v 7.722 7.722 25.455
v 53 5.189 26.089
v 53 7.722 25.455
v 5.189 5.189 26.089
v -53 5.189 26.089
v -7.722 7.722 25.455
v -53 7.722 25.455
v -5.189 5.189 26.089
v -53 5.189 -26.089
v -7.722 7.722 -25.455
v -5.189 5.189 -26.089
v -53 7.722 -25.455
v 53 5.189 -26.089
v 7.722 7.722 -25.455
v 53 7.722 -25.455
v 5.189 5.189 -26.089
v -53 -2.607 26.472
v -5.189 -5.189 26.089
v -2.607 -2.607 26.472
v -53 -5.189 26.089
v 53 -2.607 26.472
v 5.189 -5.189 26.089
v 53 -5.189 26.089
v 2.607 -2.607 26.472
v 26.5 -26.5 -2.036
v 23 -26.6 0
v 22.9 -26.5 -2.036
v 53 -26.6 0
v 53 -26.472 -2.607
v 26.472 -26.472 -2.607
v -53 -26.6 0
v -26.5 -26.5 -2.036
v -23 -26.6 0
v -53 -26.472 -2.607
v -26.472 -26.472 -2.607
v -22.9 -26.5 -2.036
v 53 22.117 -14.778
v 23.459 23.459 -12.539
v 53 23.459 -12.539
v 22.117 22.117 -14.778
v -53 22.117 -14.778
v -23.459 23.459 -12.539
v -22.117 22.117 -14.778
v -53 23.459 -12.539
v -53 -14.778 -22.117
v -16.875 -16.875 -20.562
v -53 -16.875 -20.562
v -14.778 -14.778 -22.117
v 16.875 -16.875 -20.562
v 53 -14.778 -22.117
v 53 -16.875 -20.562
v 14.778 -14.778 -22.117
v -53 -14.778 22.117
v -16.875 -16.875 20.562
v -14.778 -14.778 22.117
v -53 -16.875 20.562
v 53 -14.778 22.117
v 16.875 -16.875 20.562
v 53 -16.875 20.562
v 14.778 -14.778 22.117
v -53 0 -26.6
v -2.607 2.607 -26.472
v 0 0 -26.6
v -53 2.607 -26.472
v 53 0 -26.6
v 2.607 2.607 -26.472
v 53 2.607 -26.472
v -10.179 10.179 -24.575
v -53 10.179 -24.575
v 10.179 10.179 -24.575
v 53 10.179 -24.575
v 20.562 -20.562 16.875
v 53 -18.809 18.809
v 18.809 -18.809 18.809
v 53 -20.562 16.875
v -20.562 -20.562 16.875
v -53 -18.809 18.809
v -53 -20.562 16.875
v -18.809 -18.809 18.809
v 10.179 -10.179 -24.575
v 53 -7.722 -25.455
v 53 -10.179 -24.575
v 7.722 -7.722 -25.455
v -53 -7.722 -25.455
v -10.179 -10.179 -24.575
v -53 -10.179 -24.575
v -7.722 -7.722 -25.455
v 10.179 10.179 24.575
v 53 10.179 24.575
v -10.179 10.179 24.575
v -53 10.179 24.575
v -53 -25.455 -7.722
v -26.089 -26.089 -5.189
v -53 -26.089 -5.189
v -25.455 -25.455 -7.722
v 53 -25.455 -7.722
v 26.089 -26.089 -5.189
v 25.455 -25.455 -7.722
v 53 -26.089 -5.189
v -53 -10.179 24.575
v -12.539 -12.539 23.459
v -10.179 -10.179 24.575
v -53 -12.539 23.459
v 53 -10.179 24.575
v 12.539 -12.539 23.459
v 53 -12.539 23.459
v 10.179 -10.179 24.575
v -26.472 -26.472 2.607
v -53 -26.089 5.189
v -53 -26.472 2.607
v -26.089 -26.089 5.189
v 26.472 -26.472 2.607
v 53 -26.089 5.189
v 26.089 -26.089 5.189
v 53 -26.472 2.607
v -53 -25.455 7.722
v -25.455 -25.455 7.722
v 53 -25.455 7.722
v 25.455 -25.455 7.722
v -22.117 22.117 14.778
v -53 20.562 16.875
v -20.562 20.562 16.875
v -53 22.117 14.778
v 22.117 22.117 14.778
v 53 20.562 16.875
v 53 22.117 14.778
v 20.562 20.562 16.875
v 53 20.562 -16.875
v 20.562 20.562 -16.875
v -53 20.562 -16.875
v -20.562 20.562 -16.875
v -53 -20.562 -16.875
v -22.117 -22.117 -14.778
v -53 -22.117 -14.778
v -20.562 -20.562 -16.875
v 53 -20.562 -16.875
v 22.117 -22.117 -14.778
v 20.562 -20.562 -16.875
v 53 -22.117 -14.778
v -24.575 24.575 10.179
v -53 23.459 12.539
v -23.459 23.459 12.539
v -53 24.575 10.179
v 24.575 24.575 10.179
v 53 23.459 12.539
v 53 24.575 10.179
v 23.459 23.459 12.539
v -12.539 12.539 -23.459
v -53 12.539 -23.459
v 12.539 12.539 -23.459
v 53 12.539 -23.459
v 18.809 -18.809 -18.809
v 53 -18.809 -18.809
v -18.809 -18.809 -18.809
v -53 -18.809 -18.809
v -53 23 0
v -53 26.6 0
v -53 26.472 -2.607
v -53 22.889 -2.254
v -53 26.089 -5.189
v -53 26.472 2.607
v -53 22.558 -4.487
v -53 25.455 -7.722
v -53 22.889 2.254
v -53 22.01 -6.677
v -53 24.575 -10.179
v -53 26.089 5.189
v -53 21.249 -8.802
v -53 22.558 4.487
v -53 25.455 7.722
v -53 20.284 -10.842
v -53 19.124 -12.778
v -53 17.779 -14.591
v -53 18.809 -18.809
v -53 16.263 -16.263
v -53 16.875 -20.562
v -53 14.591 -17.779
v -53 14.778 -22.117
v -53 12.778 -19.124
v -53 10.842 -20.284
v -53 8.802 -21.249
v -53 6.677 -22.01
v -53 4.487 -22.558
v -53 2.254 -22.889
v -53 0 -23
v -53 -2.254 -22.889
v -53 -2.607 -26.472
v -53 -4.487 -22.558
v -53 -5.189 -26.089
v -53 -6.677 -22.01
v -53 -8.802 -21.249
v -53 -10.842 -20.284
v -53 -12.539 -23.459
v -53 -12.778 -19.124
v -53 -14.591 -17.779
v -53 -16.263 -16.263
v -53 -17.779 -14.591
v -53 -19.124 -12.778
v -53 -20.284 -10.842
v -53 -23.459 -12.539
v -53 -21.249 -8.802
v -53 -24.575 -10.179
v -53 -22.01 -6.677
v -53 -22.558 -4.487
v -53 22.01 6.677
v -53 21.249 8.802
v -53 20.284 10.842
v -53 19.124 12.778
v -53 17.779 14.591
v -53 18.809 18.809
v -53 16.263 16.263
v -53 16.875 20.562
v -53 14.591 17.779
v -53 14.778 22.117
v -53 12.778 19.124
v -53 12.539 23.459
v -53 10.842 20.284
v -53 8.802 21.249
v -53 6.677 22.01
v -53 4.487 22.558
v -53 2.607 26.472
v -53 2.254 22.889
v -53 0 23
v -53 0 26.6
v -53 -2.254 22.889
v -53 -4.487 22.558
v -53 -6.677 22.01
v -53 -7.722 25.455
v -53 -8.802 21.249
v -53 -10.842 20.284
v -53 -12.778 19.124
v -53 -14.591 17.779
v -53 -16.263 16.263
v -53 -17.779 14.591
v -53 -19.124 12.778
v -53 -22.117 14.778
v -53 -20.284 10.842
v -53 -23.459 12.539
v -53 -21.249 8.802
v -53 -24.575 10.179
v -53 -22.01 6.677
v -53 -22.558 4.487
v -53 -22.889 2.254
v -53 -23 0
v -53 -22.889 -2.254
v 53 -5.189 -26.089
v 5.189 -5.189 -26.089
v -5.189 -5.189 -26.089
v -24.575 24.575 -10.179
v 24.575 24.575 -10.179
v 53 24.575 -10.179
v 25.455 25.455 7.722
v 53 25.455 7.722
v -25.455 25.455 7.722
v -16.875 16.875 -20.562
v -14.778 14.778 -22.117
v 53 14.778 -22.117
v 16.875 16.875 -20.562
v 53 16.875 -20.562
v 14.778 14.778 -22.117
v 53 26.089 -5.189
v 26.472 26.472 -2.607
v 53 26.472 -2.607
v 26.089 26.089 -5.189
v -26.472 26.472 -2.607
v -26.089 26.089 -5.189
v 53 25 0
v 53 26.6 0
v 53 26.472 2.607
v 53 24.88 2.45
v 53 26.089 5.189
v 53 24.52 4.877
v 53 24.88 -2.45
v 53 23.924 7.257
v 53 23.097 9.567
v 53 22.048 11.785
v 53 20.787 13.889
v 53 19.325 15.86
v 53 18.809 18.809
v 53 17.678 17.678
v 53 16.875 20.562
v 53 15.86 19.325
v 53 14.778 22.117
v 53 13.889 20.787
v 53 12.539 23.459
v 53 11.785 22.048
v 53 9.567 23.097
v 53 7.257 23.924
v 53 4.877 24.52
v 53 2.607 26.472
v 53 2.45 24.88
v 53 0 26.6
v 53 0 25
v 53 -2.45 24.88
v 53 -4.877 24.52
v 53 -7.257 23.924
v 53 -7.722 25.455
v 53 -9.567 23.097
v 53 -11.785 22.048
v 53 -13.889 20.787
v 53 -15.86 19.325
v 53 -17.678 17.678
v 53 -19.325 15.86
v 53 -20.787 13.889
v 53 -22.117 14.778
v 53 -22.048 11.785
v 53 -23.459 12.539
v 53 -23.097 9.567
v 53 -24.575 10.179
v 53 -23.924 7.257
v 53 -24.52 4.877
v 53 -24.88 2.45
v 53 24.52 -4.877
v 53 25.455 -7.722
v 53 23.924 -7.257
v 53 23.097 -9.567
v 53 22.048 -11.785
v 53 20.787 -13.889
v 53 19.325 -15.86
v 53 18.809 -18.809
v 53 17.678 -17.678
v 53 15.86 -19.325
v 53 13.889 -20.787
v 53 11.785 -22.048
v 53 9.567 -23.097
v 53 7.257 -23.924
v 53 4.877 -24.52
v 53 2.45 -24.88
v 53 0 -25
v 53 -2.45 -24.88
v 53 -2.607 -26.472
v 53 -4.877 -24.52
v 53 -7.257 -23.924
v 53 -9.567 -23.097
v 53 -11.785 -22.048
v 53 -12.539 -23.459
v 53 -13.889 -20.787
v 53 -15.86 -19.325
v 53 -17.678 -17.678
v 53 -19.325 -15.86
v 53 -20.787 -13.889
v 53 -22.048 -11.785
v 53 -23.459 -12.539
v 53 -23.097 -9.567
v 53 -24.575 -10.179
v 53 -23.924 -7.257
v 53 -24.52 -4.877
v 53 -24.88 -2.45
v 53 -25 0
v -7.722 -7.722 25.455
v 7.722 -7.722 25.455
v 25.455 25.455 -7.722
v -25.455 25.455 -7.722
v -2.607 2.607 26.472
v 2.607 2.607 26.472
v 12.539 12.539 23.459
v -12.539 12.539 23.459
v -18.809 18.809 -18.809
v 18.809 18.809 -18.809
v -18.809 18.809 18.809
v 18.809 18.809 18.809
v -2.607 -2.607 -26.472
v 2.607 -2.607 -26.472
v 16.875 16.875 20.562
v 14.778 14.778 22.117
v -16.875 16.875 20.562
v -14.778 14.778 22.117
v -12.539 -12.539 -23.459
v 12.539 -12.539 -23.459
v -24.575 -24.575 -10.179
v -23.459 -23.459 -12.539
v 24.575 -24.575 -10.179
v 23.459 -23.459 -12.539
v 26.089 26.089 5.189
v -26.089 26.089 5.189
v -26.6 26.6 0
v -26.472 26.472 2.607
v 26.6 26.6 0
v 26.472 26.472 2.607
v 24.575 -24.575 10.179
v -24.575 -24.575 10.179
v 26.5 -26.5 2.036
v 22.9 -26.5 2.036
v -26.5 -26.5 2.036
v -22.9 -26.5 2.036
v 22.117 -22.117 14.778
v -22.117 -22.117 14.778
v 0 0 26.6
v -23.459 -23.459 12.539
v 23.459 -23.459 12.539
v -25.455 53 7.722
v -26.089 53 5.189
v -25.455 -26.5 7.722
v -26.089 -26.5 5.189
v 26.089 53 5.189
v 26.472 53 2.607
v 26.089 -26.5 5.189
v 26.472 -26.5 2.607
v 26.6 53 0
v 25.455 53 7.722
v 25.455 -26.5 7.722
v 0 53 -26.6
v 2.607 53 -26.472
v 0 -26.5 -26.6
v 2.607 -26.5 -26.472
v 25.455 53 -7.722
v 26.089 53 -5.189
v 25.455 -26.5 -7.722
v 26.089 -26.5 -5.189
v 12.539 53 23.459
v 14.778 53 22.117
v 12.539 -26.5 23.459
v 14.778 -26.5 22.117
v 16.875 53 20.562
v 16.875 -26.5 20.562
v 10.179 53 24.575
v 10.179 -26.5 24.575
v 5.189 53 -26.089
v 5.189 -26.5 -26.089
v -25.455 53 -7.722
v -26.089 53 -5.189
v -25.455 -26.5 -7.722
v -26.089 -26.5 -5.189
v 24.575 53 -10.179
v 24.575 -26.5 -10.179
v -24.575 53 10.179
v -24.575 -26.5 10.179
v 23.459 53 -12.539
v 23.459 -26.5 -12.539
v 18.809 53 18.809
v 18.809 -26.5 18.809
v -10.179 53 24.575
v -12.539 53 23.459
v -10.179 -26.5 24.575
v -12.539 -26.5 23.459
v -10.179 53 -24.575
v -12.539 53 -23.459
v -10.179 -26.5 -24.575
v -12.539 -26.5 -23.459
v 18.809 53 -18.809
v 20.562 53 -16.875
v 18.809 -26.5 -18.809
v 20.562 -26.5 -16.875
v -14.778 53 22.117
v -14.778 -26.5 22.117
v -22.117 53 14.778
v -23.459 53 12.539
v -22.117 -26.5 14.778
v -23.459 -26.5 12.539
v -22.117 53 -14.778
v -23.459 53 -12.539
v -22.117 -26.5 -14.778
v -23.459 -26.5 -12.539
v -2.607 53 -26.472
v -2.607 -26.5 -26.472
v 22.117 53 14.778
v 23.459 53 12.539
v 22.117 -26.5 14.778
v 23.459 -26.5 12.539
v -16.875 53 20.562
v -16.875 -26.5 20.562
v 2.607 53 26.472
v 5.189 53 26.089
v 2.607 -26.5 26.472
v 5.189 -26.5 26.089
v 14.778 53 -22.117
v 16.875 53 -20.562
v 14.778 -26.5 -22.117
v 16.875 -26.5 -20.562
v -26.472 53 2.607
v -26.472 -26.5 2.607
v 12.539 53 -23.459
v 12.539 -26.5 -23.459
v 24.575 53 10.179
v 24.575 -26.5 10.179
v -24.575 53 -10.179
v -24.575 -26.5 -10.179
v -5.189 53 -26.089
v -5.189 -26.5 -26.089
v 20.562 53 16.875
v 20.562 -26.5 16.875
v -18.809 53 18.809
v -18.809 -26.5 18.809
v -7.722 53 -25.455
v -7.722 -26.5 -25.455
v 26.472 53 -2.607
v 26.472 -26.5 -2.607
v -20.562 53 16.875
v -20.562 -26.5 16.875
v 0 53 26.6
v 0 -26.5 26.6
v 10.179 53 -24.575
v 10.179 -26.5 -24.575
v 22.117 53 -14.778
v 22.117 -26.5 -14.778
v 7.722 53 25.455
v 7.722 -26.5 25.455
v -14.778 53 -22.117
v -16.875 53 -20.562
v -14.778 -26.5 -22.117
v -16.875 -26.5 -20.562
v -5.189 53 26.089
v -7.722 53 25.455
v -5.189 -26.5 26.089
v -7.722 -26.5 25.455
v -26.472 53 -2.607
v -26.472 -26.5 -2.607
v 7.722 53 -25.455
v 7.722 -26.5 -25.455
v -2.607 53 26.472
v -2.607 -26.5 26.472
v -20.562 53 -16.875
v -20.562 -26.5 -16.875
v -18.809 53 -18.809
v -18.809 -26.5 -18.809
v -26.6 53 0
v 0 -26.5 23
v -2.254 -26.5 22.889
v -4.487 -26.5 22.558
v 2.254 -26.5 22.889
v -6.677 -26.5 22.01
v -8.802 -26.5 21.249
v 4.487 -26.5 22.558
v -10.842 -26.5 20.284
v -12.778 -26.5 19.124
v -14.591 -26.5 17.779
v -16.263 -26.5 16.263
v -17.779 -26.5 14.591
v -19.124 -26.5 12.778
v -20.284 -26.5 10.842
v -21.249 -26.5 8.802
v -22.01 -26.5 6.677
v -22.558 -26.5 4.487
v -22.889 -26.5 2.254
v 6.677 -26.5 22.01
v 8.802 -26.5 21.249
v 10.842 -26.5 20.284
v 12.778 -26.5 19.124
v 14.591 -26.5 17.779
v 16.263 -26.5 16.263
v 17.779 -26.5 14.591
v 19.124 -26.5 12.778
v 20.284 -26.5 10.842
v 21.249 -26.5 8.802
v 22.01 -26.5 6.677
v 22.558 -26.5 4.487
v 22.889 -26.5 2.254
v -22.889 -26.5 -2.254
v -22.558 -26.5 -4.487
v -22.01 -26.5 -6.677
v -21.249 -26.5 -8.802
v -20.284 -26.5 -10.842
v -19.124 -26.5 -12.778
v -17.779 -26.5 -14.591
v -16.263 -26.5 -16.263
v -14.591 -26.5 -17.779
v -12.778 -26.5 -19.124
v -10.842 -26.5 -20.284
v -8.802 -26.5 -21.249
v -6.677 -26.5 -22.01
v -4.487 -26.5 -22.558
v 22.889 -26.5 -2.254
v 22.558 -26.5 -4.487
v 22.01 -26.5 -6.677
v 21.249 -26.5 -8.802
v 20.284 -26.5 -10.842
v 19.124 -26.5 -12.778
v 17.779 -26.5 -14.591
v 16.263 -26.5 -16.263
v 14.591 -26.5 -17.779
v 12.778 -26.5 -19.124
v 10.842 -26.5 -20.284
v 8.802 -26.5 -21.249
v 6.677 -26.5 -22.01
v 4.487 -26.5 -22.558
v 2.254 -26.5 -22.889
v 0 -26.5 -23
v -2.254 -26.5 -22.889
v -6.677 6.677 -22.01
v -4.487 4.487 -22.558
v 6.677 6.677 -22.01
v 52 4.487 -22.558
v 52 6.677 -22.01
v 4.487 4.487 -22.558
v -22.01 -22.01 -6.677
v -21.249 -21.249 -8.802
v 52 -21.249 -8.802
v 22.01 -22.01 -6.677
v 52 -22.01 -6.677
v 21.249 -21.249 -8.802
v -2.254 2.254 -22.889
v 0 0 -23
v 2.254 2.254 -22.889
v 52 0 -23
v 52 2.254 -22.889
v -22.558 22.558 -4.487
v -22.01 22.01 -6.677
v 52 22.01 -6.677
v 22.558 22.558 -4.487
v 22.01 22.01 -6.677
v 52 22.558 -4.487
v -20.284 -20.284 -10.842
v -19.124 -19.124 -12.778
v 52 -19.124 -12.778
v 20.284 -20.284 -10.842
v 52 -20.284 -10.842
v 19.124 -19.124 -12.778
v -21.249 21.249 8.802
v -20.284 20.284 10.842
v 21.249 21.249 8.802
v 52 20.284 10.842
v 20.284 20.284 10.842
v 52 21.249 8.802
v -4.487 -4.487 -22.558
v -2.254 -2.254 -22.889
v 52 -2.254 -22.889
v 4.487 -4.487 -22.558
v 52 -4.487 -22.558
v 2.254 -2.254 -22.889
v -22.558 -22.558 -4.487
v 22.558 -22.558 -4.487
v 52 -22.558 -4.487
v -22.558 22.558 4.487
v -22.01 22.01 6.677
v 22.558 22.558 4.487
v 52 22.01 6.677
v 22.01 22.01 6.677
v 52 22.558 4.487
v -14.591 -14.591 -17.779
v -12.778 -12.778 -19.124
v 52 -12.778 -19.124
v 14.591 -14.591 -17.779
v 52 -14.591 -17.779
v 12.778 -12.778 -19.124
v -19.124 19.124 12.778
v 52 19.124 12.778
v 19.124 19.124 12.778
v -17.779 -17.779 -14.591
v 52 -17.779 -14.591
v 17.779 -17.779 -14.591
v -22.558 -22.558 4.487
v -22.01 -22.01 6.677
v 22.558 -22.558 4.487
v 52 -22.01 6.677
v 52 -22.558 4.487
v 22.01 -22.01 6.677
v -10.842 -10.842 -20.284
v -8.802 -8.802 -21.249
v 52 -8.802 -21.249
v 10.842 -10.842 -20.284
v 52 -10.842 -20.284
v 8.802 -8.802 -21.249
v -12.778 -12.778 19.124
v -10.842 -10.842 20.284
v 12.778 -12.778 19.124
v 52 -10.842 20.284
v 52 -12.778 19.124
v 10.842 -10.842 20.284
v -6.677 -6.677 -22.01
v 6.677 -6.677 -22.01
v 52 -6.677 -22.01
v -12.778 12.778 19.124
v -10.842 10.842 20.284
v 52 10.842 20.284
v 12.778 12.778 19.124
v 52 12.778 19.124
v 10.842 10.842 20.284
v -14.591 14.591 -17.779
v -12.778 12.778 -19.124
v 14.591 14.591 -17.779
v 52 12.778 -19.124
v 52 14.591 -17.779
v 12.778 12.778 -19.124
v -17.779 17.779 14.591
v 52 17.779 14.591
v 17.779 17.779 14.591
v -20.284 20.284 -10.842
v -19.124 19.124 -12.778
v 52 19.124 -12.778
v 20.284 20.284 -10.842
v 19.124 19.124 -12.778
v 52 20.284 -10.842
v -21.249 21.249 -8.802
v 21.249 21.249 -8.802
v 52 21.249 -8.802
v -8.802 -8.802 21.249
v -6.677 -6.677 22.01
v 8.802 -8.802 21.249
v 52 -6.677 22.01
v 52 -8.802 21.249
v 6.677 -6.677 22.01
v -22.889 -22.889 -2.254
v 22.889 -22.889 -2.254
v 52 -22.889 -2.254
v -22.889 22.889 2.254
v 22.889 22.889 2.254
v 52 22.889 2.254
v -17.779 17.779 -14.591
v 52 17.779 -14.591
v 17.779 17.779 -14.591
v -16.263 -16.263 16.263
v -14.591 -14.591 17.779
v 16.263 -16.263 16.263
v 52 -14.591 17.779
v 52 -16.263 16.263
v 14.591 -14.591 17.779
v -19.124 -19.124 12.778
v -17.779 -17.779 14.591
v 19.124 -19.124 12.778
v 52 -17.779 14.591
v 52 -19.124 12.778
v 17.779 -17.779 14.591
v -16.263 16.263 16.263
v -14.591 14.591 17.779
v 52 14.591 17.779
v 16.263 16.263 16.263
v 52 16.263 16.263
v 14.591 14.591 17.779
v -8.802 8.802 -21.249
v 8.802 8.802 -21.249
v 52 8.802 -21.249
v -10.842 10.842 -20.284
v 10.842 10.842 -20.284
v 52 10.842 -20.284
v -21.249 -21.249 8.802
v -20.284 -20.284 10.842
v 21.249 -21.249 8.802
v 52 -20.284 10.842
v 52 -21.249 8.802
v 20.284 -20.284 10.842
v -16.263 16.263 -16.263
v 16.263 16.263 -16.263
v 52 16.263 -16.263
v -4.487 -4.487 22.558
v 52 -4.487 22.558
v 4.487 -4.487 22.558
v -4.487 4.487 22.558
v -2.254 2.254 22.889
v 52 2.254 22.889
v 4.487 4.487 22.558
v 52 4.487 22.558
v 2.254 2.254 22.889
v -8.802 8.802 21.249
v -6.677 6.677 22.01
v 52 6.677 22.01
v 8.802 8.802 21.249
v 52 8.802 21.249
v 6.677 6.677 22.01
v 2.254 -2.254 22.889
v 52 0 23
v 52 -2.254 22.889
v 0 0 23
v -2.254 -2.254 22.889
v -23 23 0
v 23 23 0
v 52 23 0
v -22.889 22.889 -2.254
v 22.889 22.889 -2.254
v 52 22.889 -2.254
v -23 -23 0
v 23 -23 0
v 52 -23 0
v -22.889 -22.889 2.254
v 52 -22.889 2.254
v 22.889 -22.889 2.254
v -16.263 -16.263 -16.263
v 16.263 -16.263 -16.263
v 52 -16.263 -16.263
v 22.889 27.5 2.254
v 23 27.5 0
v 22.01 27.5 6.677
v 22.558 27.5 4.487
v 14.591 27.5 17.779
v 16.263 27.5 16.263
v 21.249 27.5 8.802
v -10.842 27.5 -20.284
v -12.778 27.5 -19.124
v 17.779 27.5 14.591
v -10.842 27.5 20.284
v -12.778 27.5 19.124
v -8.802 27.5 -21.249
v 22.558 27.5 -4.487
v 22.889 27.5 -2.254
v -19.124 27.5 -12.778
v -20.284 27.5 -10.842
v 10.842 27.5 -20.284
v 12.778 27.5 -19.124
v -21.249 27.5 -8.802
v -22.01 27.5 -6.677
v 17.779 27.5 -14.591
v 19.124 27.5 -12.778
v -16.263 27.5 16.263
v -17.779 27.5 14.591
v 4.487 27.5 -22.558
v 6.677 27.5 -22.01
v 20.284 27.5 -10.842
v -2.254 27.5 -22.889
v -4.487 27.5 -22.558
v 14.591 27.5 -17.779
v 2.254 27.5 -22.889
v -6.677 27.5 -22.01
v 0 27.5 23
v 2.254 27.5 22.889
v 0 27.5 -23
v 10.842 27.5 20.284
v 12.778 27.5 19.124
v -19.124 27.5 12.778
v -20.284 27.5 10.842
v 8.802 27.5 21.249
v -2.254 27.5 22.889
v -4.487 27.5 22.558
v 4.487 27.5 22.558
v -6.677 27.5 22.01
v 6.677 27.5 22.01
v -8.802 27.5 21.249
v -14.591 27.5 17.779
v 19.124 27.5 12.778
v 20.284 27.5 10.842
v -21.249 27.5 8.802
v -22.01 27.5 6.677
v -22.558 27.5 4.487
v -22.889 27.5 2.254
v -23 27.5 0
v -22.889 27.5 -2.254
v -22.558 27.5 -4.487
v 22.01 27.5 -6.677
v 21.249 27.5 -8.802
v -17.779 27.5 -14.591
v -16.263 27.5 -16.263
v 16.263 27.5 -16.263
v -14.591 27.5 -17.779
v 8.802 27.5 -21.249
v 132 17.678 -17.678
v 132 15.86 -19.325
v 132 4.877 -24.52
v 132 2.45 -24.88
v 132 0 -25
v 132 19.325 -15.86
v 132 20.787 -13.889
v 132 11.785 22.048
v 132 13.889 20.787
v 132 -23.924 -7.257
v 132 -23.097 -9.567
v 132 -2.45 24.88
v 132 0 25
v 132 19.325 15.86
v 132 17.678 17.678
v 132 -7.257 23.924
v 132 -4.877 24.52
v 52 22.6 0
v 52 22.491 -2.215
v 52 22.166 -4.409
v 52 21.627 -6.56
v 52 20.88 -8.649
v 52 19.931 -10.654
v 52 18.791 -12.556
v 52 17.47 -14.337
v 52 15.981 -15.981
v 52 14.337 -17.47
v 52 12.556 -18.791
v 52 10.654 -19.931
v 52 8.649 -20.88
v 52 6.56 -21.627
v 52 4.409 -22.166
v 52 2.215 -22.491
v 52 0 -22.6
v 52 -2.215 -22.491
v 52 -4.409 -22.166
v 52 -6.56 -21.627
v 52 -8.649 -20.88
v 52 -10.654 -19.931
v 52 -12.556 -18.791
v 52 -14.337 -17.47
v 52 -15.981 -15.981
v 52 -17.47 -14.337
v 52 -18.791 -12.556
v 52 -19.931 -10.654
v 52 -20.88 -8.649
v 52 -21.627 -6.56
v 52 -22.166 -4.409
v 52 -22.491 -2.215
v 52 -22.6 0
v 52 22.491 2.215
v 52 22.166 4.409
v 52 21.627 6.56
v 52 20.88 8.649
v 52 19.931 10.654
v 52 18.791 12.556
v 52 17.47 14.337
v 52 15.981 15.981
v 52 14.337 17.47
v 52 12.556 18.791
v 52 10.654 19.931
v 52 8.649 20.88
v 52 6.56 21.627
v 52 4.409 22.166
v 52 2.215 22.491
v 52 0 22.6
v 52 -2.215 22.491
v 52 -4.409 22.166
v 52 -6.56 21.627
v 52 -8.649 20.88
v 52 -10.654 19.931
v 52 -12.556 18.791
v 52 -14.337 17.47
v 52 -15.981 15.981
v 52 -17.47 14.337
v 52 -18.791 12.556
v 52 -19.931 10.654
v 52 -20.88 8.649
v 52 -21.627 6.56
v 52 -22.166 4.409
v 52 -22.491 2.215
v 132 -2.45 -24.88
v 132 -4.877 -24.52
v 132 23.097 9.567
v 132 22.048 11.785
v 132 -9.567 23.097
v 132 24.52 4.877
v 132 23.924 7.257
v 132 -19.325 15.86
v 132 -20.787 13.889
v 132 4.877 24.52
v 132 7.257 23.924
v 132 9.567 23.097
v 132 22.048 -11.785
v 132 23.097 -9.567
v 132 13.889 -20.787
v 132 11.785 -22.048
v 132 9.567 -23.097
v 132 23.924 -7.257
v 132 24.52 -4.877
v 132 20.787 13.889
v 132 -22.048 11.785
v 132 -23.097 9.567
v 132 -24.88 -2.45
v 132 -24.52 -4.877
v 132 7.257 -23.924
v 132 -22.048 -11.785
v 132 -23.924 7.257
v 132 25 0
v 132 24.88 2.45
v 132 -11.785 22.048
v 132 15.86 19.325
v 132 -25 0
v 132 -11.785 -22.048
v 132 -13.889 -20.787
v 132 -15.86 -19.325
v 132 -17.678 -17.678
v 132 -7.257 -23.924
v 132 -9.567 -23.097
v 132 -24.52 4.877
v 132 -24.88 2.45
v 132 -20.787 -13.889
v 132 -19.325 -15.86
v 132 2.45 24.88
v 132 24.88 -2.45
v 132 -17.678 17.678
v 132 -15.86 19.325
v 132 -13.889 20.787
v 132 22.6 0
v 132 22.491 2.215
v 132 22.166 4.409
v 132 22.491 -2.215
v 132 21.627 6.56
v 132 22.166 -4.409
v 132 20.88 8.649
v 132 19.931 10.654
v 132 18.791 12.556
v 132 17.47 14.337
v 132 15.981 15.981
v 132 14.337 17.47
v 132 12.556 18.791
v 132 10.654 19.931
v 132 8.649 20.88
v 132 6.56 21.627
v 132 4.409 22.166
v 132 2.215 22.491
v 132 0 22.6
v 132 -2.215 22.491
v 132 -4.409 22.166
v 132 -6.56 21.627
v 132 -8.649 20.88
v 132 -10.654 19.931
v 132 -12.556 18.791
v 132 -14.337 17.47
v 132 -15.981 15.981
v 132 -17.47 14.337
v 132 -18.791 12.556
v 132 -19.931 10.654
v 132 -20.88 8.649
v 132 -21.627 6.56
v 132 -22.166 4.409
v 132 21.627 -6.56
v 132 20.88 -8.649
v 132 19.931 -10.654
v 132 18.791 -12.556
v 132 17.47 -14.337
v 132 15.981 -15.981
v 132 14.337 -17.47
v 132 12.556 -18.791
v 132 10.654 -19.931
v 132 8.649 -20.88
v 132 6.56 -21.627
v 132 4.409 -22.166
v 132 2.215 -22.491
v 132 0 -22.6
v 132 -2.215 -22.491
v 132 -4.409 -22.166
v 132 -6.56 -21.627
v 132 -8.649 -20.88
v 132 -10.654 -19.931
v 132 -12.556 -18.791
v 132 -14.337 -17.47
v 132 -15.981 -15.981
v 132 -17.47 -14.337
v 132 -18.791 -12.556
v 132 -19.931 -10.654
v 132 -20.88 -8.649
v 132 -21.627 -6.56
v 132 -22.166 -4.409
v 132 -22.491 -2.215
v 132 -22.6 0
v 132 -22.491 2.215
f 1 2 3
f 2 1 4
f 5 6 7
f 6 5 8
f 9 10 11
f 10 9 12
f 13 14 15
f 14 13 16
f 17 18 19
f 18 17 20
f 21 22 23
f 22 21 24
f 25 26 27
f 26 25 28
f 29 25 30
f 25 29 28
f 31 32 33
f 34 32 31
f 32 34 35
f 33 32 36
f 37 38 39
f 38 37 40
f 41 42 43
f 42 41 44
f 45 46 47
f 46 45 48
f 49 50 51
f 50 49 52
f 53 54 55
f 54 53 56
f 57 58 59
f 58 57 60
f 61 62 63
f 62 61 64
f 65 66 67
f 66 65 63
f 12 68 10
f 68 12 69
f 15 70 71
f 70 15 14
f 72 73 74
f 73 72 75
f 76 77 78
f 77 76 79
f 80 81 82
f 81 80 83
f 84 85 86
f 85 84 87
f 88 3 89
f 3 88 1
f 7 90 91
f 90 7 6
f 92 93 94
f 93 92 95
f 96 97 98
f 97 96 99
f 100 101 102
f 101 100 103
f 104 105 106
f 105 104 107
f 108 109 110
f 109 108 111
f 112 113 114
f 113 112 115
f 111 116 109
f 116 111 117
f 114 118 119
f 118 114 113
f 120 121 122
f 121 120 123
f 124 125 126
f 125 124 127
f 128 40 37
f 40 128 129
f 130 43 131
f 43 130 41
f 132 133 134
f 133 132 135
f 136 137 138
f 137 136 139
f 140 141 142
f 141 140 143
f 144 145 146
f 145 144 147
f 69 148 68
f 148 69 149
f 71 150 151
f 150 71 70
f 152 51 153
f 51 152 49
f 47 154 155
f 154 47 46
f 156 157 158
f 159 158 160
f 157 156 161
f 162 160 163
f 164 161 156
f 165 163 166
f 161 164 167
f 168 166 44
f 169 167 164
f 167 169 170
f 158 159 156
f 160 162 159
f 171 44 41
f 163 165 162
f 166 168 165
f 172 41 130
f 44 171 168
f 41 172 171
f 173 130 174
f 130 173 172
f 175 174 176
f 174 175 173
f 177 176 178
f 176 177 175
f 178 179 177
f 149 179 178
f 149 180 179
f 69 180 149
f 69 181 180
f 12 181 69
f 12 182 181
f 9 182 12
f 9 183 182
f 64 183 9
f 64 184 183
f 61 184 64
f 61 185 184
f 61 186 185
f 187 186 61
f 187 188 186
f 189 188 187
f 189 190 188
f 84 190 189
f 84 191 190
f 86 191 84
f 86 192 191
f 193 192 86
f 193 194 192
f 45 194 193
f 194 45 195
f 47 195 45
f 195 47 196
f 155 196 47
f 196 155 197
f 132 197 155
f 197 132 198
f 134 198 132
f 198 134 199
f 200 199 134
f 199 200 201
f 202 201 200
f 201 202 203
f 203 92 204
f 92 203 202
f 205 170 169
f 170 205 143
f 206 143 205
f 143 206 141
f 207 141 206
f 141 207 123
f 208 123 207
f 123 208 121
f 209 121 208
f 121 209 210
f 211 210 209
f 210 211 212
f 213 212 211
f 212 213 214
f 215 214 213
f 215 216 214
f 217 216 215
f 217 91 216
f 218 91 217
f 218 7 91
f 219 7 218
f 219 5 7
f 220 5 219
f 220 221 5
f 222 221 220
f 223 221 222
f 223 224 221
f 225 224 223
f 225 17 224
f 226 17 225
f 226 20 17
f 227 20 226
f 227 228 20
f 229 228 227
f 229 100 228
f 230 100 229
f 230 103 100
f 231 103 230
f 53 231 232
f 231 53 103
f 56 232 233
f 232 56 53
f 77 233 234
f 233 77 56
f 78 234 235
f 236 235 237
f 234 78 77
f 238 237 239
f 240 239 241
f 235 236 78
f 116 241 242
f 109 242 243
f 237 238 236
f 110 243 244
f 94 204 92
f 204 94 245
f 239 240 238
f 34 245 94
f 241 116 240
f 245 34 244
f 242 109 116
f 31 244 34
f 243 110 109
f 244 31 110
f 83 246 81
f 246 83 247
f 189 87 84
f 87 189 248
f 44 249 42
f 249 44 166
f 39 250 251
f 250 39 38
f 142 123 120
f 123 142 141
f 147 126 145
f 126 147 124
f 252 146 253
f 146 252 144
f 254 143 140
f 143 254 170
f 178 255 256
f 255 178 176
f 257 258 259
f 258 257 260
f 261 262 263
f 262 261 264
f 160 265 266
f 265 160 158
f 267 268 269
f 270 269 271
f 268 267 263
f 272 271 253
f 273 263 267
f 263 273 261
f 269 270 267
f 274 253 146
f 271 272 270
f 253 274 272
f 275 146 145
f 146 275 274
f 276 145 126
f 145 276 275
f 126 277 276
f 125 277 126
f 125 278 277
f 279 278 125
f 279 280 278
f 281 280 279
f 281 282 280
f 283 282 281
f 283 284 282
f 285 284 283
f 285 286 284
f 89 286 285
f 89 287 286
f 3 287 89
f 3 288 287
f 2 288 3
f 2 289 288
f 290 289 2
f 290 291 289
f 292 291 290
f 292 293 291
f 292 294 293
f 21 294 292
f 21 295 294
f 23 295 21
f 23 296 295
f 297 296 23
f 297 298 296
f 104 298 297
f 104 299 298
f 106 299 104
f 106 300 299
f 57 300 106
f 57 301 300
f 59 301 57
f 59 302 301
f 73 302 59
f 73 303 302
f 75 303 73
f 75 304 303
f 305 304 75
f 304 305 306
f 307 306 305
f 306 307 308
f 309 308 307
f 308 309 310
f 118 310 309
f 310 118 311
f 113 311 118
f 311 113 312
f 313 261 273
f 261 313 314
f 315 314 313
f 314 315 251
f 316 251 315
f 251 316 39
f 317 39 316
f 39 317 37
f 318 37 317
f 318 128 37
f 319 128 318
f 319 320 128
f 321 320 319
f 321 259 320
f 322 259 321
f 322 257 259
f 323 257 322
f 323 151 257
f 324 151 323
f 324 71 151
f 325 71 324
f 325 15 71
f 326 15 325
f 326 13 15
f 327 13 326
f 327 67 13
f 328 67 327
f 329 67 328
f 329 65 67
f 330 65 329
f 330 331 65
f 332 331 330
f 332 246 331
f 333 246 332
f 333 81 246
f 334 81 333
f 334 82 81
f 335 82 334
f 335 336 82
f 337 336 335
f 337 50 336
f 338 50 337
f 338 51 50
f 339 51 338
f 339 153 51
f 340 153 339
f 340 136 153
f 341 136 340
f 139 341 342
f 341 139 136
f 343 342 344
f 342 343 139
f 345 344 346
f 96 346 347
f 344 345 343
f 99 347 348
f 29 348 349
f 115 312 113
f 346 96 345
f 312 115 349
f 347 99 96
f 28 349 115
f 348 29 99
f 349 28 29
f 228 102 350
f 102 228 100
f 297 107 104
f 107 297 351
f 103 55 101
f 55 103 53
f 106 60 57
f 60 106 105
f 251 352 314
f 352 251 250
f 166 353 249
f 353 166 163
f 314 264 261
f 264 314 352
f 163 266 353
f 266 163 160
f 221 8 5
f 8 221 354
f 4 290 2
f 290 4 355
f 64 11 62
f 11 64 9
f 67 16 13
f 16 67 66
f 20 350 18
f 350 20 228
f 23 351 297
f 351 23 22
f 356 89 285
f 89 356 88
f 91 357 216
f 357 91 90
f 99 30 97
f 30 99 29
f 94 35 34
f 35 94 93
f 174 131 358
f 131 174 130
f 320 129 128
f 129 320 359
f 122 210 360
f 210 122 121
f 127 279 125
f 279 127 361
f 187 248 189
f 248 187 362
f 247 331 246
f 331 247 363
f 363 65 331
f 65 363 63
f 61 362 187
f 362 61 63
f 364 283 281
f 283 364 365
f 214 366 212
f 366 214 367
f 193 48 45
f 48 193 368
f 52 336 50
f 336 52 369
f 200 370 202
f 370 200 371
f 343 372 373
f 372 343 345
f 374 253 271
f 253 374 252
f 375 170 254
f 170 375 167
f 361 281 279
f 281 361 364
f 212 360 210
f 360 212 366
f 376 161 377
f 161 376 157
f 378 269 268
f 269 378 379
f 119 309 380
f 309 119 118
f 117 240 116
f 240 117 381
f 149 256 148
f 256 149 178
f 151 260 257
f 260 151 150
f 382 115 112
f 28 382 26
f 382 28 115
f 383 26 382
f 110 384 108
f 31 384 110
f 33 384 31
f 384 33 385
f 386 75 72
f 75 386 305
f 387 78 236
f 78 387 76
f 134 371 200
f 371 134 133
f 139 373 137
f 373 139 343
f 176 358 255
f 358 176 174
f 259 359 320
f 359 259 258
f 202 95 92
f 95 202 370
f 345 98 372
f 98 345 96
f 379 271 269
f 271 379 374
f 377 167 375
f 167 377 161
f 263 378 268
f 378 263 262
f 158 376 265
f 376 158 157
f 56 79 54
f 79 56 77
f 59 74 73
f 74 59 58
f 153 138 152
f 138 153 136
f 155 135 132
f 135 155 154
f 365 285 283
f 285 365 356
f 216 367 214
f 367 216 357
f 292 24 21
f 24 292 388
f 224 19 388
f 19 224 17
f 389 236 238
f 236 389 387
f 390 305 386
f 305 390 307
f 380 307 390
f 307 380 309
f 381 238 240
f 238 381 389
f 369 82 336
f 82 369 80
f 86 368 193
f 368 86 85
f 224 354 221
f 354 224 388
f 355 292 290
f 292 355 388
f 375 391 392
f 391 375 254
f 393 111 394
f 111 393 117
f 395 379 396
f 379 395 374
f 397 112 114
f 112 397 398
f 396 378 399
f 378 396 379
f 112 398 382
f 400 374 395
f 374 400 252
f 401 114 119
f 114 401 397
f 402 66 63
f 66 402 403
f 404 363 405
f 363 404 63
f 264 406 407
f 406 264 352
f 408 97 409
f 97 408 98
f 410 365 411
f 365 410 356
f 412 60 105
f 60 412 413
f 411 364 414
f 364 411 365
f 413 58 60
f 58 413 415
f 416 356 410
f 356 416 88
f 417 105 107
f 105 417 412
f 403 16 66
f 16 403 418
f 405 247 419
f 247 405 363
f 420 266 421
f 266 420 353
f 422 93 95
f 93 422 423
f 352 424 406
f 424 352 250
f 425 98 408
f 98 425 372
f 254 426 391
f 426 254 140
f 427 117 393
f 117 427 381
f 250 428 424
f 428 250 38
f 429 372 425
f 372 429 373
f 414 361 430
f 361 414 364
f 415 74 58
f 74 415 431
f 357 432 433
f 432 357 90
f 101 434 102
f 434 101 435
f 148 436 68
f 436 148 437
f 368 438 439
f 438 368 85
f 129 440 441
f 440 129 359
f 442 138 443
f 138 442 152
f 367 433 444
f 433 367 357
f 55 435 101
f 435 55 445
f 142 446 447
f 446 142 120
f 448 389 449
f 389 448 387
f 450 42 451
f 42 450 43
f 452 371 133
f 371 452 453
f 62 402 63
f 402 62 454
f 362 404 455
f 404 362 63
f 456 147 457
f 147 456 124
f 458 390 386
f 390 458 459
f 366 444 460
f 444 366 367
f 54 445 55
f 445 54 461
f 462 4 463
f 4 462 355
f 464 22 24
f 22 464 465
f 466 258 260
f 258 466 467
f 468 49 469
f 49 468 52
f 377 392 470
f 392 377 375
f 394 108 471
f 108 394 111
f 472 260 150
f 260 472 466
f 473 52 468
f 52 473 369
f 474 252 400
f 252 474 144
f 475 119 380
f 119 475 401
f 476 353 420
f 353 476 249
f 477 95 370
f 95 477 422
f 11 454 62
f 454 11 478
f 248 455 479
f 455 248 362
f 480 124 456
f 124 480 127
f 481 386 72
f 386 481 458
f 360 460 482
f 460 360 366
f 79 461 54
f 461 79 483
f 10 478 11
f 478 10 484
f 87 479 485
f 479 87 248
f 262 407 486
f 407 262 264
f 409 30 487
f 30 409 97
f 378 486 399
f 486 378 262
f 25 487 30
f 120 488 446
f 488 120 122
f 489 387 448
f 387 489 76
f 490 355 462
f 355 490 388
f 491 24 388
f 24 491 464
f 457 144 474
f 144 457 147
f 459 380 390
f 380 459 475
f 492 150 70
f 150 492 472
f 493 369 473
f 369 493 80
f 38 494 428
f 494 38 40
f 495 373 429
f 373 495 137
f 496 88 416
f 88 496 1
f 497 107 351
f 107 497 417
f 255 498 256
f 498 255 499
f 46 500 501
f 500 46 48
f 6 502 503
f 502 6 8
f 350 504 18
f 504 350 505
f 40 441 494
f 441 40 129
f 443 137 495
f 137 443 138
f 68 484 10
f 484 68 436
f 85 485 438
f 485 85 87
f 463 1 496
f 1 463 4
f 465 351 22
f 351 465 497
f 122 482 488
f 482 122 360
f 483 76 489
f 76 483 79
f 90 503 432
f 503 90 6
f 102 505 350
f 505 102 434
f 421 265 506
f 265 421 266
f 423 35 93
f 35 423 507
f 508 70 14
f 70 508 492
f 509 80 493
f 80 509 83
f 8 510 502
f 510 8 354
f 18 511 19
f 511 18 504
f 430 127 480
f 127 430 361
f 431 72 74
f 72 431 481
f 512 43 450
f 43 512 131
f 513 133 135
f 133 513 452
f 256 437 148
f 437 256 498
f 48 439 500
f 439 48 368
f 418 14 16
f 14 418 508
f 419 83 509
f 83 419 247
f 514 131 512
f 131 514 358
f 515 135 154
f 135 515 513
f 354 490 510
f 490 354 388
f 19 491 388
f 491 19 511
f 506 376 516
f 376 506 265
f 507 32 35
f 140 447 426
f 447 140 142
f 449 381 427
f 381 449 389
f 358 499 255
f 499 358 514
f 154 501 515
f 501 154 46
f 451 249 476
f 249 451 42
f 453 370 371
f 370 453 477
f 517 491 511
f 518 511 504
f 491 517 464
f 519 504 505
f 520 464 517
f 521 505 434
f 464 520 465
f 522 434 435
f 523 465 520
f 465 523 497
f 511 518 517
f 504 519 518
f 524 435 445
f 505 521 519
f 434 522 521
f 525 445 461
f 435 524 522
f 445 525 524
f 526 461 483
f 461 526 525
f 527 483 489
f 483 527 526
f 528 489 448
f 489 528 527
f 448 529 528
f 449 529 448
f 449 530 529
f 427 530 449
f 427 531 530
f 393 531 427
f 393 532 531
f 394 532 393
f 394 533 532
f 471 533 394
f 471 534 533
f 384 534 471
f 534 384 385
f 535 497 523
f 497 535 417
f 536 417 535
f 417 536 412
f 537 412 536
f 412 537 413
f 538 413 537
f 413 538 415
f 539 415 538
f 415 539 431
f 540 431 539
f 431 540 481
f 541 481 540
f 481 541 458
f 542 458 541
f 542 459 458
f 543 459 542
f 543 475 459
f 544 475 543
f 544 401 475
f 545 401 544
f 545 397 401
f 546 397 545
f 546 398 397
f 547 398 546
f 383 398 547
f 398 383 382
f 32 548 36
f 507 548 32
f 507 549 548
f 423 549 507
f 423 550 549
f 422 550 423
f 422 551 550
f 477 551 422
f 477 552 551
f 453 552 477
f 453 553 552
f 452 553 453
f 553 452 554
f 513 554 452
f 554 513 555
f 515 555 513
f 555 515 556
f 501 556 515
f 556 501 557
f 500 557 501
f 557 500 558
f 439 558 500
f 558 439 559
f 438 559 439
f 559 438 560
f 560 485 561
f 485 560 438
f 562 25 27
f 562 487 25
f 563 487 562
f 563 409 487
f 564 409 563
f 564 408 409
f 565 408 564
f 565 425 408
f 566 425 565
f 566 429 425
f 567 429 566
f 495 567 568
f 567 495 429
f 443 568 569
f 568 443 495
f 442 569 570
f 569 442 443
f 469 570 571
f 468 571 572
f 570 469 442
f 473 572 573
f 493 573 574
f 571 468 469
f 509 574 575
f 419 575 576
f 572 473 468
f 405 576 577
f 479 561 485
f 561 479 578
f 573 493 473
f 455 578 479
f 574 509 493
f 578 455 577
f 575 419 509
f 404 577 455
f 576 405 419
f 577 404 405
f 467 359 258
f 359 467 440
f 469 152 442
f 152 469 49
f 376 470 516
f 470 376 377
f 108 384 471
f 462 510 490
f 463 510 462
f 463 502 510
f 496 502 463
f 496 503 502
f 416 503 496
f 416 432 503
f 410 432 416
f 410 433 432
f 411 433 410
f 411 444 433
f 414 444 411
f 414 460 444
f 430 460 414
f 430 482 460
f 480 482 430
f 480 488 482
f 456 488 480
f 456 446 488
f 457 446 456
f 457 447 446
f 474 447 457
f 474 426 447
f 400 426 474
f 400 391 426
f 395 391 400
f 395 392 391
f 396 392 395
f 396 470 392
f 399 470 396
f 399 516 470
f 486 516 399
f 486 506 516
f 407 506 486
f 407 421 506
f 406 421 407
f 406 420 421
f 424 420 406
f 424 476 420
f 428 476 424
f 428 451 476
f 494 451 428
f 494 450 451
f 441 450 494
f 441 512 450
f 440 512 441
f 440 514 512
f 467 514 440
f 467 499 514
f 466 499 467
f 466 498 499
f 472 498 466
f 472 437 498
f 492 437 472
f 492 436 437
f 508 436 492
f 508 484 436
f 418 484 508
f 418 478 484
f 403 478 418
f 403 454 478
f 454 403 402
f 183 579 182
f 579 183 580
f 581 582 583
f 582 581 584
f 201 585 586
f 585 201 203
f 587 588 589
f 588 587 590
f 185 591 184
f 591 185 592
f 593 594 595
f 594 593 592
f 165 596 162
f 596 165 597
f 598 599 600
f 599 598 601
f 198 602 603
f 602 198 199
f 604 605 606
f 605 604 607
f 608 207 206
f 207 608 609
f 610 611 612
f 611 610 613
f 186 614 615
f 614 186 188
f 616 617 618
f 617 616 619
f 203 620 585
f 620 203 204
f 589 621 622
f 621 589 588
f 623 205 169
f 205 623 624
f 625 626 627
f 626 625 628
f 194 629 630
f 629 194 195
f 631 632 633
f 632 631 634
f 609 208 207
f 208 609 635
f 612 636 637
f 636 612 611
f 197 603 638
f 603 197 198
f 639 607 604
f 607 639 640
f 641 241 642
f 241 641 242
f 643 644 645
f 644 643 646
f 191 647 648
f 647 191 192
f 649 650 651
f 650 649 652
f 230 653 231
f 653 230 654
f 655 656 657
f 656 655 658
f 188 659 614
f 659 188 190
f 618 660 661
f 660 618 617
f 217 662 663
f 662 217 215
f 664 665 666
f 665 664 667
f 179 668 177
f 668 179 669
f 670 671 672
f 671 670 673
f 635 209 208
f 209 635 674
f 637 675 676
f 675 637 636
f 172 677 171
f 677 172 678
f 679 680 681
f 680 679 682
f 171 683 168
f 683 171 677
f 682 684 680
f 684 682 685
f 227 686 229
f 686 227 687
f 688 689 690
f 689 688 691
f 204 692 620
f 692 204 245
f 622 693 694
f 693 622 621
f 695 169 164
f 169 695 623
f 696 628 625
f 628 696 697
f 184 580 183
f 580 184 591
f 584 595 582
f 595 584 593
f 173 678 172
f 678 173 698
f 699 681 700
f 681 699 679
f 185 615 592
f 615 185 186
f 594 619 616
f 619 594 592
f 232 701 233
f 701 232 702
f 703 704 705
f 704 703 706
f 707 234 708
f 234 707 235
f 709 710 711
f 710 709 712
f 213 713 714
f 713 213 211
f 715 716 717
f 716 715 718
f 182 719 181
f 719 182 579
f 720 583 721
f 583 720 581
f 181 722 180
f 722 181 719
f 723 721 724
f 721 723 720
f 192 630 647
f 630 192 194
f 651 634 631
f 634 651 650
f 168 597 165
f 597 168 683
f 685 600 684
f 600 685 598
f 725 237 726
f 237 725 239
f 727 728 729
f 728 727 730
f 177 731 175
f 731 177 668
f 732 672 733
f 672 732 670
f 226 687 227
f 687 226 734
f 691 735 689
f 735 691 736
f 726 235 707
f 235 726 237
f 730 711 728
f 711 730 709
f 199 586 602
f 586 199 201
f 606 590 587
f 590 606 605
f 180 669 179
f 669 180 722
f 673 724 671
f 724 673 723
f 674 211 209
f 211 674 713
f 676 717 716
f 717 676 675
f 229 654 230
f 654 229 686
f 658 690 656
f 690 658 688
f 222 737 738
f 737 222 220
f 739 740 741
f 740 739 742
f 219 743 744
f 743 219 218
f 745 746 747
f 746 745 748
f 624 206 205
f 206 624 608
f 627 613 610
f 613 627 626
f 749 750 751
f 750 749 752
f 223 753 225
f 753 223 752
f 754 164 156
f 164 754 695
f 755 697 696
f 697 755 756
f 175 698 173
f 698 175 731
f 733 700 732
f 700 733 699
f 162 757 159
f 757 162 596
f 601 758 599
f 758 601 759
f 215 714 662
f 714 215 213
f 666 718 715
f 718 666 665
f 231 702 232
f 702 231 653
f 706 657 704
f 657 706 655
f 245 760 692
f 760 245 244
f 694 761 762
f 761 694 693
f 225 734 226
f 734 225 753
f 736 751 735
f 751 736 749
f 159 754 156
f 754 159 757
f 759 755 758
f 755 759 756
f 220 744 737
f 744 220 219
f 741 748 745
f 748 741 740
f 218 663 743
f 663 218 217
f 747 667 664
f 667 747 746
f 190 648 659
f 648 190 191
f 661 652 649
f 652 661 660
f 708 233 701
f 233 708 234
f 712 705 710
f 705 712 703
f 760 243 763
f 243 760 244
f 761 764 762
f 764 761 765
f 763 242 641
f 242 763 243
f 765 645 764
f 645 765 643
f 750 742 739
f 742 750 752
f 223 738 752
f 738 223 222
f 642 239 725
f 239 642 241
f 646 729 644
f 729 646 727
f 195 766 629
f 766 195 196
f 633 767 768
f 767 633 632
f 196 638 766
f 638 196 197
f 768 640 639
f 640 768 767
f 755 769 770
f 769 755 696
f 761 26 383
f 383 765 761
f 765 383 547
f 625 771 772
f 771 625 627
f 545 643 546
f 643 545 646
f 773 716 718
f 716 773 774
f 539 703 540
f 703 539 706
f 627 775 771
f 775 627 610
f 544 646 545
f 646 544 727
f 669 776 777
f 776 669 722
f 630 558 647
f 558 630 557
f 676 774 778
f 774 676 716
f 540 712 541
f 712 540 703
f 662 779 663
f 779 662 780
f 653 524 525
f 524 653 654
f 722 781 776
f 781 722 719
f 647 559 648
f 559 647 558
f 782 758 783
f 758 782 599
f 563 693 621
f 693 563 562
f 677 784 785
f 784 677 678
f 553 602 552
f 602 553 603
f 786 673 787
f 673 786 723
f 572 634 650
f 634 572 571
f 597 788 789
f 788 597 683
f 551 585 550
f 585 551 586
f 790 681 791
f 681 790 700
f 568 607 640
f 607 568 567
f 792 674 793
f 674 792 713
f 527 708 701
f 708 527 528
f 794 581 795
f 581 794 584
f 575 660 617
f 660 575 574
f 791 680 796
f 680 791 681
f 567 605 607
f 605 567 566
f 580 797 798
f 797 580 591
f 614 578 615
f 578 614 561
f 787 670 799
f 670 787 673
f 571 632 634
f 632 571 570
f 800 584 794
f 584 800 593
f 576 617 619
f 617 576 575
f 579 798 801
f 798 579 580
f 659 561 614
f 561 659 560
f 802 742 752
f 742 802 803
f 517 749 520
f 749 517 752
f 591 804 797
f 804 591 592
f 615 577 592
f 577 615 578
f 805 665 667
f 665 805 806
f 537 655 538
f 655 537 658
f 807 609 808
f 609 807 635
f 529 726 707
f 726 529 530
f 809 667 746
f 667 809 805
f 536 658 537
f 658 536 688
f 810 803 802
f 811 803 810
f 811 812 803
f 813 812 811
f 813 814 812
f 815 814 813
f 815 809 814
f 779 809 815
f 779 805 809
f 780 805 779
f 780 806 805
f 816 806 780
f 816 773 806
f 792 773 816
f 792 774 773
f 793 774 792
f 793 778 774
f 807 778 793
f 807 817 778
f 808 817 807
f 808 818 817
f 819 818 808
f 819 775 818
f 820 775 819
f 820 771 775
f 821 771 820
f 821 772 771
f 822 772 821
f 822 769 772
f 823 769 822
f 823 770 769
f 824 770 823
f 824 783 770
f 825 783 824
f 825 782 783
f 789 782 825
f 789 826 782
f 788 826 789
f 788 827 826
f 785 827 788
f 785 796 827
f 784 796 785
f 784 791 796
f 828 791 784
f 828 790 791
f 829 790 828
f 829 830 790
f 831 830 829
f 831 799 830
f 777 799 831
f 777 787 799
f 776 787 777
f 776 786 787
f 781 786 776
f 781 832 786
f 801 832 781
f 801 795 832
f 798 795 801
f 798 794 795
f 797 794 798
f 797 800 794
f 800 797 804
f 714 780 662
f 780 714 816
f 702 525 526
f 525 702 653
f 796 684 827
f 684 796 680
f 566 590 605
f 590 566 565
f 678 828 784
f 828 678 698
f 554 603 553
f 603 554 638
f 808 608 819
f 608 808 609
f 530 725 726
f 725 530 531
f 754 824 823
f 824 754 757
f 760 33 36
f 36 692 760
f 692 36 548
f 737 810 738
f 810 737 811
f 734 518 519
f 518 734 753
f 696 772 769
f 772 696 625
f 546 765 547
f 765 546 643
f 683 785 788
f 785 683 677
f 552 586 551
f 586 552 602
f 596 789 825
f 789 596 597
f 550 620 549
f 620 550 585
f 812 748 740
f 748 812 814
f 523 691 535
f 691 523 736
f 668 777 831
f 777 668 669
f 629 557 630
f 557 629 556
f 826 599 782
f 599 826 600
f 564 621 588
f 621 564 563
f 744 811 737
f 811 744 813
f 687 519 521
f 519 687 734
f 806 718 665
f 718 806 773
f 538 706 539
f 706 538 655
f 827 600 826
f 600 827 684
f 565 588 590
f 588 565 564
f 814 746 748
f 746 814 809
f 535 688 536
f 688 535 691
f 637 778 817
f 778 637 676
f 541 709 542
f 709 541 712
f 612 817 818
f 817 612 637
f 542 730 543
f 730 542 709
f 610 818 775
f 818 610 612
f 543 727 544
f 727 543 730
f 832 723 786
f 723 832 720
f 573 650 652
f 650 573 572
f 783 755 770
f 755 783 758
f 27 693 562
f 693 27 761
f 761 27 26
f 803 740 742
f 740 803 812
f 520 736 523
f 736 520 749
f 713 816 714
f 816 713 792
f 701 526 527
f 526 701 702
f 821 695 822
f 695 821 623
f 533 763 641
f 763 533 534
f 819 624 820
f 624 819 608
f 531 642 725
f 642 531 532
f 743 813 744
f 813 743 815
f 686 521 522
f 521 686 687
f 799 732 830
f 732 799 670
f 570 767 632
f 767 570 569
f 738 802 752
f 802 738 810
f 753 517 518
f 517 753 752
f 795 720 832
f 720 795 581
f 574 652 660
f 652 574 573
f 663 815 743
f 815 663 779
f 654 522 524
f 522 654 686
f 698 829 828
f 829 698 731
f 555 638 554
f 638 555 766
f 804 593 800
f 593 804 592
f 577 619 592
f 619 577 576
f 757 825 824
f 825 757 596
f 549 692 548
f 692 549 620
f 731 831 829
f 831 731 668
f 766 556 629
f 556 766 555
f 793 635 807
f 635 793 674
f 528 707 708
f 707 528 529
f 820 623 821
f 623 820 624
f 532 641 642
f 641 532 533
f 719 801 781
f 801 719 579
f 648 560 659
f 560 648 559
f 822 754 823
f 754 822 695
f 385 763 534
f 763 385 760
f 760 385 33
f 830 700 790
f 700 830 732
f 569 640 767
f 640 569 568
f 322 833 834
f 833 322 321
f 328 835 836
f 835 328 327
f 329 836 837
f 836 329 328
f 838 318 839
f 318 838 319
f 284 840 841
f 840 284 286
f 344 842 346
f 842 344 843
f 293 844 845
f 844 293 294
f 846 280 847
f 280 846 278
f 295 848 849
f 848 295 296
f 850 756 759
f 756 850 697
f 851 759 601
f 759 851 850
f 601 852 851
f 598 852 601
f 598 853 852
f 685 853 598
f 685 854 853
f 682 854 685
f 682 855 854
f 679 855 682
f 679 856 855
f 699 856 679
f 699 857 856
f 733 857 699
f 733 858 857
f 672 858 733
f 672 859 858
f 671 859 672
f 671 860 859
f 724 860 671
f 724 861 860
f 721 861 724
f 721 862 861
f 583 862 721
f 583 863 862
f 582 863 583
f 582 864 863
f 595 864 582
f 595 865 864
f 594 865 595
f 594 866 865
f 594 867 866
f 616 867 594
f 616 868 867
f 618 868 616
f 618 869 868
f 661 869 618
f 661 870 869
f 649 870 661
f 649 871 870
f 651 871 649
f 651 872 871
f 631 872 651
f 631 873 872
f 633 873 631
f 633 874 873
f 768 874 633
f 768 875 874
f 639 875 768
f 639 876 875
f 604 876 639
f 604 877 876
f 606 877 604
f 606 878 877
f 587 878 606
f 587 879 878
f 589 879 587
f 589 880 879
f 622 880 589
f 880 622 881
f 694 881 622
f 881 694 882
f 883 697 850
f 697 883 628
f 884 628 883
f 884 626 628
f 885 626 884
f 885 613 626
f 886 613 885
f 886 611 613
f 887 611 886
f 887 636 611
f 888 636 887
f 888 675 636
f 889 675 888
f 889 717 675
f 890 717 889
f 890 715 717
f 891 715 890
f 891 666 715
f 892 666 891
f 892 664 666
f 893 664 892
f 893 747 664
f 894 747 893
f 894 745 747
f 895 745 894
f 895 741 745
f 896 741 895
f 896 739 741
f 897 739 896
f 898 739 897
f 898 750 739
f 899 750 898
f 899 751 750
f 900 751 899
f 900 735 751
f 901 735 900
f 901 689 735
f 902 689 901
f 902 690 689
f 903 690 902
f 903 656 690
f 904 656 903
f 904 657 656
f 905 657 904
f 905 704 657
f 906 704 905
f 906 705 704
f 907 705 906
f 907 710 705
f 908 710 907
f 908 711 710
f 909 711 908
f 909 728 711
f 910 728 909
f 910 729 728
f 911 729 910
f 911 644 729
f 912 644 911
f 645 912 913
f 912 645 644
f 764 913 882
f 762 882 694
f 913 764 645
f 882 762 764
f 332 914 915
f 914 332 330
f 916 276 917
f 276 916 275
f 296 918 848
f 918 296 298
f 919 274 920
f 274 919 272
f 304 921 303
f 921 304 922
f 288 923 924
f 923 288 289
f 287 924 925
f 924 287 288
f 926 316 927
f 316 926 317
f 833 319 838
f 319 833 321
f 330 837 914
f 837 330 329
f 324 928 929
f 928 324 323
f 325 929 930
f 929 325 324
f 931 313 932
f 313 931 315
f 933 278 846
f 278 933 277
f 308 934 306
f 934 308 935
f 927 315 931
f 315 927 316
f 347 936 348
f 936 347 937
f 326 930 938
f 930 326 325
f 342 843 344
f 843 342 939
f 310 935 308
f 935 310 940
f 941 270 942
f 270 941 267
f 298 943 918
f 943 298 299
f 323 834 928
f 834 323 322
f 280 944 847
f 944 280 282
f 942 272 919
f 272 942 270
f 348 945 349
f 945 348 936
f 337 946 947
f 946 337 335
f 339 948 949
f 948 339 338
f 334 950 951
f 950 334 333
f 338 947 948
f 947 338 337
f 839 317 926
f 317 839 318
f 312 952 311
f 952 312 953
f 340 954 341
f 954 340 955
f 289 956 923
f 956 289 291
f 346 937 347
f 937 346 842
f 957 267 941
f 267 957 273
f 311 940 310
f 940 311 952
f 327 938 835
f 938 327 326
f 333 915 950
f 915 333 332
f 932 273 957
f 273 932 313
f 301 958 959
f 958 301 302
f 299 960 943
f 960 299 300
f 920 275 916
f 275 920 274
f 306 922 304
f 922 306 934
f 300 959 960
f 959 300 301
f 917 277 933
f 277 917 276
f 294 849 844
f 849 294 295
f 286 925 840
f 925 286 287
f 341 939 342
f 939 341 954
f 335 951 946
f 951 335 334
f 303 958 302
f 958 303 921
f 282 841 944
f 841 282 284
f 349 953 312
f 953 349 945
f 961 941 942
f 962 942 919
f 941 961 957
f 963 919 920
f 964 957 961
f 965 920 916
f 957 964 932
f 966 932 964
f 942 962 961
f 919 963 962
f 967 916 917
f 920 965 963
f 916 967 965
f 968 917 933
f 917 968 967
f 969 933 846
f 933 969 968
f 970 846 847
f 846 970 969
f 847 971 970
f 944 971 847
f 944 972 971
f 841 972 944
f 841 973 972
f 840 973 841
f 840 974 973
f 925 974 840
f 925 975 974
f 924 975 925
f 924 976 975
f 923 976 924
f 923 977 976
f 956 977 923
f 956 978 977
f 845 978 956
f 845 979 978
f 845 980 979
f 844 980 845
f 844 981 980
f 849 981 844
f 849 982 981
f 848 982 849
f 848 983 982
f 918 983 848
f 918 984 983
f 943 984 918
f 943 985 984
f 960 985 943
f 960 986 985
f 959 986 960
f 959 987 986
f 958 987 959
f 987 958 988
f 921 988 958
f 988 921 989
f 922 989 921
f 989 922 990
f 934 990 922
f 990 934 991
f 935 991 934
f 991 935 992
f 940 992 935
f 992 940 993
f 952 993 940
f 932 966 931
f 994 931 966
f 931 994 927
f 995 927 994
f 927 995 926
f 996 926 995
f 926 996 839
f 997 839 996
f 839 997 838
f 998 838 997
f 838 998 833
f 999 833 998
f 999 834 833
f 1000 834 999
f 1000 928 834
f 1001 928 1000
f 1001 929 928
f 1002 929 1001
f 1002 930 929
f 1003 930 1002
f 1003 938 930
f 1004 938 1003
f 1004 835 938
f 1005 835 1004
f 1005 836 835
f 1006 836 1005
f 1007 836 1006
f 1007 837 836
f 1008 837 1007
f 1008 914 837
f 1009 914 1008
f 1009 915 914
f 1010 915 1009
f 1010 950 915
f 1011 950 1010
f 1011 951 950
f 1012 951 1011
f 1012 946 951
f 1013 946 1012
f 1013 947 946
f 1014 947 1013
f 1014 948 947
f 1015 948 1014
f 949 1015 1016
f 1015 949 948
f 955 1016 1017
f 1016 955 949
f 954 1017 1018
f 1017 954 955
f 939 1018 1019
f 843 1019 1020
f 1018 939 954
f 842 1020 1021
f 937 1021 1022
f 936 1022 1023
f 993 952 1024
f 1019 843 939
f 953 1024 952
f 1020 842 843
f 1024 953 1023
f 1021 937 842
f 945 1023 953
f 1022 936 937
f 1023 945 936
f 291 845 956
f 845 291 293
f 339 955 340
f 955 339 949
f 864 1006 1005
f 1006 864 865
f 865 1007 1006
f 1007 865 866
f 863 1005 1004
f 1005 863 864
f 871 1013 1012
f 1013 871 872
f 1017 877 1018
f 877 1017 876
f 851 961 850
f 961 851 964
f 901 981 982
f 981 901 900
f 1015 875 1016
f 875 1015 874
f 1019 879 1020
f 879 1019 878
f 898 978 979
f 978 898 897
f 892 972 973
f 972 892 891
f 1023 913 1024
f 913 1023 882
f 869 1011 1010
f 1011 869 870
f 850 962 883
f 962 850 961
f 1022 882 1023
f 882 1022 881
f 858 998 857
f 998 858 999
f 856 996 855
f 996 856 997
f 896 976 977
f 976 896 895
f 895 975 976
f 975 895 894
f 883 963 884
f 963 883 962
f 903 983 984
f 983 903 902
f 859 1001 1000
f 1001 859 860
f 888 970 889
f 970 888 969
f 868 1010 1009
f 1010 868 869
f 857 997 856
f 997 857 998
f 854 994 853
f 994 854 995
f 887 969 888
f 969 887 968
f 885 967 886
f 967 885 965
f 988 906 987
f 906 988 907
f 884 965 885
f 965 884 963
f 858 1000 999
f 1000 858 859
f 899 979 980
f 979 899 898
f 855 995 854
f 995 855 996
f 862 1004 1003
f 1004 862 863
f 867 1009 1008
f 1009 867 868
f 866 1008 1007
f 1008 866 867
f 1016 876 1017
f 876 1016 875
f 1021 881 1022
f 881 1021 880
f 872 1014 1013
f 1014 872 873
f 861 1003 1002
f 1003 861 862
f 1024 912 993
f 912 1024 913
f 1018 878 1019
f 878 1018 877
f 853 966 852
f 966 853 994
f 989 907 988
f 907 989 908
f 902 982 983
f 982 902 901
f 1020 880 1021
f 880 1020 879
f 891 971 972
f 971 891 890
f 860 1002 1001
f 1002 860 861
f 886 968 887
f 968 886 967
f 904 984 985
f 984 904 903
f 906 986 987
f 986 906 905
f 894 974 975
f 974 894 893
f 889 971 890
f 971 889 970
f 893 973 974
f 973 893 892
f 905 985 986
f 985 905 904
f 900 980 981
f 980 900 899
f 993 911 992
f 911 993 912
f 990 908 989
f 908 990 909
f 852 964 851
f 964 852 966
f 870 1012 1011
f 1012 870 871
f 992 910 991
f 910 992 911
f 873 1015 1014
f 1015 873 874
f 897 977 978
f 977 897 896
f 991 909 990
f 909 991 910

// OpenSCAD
// Parameters
nominal_diameter_mm = 50; //[25:100:1]
port_count = 3; //[3:3:1]
main_run_angle_deg = 180; //[180:180:1]
branch_angle_deg = 90; //[45:90:1]
pipe_od = 50; //[25:100:1]
pipe_wall = 2.4; //[1.2:4.8:0.1]
socket_wall_extra = 1.6; //[0.8:3.2:0.1]
socket_length = 35; //[18:70:1]
hub_length_each_side = 18; //[9:36:1]
branch_hub_length = 18; //[9:36:1]
overlap = 1; //[0.5:2:0.1]
ht_pipe_stub_length = 80; //[40:160:1]
flow_clearance = 0.4; //[0.2:1.0:0.1]

$fn = 64;

// HT Pipe - complete geometry (hollow stub)
module ht_pipe() {
  difference() {
    cylinder(r=pipe_od/2, h=ht_pipe_stub_length, center=true);
    translate([0,0,-overlap])
      cylinder(r=(pipe_od/2) - pipe_wall, h=ht_pipe_stub_length + 2*overlap, center=true);
  }
}

// Tee fitting - complete geometry (single solid via difference of outer - inner)
module tee_fitting() {

  // Key lengths along axes (centered cylinders)
  main_outer_len   = 2*hub_length_each_side + 2*socket_length;
  branch_outer_len = branch_hub_length + socket_length;

  main_inner_len   = main_outer_len   + 2*overlap;
  branch_inner_len = branch_outer_len + 2*overlap;

  outer_r = (pipe_od/2) + socket_wall_extra;
  inner_r = (pipe_od/2) - pipe_wall + flow_clearance;

  difference() {
    // OUTER SOLID (unioned)
    union() {
      // Main run outer body
      rotate([0,90,0])
        cylinder(r=outer_r, h=main_outer_len, center=true);

      // Branch outer body (centered at origin so it intersects main run)
      rotate([90,0,0])
        cylinder(r=outer_r, h=branch_outer_len, center=true);

      // Socket end reinforcements (kept, but ensured to overlap with main/branch)
      translate([-(hub_length_each_side + socket_length/2 - overlap), 0, 0])
        rotate([0,90,0])
          cylinder(r=outer_r, h=socket_length + 2*overlap, center=true);

      translate([(hub_length_each_side + socket_length/2 - overlap), 0, 0])
        rotate([0,90,0])
          cylinder(r=outer_r, h=socket_length + 2*overlap, center=true);

      translate([0, (branch_hub_length + socket_length/2 - overlap), 0])
        rotate([90,0,0])
          cylinder(r=outer_r, h=socket_length + 2*overlap, center=true);
    }

    // INNER FLOW PASSAGE (subtracted)
    union() {
      rotate([0,90,0])
        cylinder(r=inner_r, h=main_inner_len, center=true);

      rotate([90,0,0])
        cylinder(r=inner_r, h=branch_inner_len, center=true);
    }
  }
}

// Assembly: attach the previously floating stub to the right socket with 1-2mm overlap
module assembly() {
  color([0.85, 0.85, 0.8])
  union() {
    tee_fitting();

    // Place stub so its left end penetrates into the right socket by `overlap`
    // Tee rightmost outer face is at +main_outer_len/2
    // Stub half-length is ht_pipe_stub_length/2
    main_outer_len = 2*hub_length_each_side + 2*socket_length;

    translate([ main_outer_len/2 + ht_pipe_stub_length/2 - overlap, 0, 0 ])
      rotate([0,90,0])  // align stub axis with main run (X axis)
        ht_pipe();
  }
}

assembly();
